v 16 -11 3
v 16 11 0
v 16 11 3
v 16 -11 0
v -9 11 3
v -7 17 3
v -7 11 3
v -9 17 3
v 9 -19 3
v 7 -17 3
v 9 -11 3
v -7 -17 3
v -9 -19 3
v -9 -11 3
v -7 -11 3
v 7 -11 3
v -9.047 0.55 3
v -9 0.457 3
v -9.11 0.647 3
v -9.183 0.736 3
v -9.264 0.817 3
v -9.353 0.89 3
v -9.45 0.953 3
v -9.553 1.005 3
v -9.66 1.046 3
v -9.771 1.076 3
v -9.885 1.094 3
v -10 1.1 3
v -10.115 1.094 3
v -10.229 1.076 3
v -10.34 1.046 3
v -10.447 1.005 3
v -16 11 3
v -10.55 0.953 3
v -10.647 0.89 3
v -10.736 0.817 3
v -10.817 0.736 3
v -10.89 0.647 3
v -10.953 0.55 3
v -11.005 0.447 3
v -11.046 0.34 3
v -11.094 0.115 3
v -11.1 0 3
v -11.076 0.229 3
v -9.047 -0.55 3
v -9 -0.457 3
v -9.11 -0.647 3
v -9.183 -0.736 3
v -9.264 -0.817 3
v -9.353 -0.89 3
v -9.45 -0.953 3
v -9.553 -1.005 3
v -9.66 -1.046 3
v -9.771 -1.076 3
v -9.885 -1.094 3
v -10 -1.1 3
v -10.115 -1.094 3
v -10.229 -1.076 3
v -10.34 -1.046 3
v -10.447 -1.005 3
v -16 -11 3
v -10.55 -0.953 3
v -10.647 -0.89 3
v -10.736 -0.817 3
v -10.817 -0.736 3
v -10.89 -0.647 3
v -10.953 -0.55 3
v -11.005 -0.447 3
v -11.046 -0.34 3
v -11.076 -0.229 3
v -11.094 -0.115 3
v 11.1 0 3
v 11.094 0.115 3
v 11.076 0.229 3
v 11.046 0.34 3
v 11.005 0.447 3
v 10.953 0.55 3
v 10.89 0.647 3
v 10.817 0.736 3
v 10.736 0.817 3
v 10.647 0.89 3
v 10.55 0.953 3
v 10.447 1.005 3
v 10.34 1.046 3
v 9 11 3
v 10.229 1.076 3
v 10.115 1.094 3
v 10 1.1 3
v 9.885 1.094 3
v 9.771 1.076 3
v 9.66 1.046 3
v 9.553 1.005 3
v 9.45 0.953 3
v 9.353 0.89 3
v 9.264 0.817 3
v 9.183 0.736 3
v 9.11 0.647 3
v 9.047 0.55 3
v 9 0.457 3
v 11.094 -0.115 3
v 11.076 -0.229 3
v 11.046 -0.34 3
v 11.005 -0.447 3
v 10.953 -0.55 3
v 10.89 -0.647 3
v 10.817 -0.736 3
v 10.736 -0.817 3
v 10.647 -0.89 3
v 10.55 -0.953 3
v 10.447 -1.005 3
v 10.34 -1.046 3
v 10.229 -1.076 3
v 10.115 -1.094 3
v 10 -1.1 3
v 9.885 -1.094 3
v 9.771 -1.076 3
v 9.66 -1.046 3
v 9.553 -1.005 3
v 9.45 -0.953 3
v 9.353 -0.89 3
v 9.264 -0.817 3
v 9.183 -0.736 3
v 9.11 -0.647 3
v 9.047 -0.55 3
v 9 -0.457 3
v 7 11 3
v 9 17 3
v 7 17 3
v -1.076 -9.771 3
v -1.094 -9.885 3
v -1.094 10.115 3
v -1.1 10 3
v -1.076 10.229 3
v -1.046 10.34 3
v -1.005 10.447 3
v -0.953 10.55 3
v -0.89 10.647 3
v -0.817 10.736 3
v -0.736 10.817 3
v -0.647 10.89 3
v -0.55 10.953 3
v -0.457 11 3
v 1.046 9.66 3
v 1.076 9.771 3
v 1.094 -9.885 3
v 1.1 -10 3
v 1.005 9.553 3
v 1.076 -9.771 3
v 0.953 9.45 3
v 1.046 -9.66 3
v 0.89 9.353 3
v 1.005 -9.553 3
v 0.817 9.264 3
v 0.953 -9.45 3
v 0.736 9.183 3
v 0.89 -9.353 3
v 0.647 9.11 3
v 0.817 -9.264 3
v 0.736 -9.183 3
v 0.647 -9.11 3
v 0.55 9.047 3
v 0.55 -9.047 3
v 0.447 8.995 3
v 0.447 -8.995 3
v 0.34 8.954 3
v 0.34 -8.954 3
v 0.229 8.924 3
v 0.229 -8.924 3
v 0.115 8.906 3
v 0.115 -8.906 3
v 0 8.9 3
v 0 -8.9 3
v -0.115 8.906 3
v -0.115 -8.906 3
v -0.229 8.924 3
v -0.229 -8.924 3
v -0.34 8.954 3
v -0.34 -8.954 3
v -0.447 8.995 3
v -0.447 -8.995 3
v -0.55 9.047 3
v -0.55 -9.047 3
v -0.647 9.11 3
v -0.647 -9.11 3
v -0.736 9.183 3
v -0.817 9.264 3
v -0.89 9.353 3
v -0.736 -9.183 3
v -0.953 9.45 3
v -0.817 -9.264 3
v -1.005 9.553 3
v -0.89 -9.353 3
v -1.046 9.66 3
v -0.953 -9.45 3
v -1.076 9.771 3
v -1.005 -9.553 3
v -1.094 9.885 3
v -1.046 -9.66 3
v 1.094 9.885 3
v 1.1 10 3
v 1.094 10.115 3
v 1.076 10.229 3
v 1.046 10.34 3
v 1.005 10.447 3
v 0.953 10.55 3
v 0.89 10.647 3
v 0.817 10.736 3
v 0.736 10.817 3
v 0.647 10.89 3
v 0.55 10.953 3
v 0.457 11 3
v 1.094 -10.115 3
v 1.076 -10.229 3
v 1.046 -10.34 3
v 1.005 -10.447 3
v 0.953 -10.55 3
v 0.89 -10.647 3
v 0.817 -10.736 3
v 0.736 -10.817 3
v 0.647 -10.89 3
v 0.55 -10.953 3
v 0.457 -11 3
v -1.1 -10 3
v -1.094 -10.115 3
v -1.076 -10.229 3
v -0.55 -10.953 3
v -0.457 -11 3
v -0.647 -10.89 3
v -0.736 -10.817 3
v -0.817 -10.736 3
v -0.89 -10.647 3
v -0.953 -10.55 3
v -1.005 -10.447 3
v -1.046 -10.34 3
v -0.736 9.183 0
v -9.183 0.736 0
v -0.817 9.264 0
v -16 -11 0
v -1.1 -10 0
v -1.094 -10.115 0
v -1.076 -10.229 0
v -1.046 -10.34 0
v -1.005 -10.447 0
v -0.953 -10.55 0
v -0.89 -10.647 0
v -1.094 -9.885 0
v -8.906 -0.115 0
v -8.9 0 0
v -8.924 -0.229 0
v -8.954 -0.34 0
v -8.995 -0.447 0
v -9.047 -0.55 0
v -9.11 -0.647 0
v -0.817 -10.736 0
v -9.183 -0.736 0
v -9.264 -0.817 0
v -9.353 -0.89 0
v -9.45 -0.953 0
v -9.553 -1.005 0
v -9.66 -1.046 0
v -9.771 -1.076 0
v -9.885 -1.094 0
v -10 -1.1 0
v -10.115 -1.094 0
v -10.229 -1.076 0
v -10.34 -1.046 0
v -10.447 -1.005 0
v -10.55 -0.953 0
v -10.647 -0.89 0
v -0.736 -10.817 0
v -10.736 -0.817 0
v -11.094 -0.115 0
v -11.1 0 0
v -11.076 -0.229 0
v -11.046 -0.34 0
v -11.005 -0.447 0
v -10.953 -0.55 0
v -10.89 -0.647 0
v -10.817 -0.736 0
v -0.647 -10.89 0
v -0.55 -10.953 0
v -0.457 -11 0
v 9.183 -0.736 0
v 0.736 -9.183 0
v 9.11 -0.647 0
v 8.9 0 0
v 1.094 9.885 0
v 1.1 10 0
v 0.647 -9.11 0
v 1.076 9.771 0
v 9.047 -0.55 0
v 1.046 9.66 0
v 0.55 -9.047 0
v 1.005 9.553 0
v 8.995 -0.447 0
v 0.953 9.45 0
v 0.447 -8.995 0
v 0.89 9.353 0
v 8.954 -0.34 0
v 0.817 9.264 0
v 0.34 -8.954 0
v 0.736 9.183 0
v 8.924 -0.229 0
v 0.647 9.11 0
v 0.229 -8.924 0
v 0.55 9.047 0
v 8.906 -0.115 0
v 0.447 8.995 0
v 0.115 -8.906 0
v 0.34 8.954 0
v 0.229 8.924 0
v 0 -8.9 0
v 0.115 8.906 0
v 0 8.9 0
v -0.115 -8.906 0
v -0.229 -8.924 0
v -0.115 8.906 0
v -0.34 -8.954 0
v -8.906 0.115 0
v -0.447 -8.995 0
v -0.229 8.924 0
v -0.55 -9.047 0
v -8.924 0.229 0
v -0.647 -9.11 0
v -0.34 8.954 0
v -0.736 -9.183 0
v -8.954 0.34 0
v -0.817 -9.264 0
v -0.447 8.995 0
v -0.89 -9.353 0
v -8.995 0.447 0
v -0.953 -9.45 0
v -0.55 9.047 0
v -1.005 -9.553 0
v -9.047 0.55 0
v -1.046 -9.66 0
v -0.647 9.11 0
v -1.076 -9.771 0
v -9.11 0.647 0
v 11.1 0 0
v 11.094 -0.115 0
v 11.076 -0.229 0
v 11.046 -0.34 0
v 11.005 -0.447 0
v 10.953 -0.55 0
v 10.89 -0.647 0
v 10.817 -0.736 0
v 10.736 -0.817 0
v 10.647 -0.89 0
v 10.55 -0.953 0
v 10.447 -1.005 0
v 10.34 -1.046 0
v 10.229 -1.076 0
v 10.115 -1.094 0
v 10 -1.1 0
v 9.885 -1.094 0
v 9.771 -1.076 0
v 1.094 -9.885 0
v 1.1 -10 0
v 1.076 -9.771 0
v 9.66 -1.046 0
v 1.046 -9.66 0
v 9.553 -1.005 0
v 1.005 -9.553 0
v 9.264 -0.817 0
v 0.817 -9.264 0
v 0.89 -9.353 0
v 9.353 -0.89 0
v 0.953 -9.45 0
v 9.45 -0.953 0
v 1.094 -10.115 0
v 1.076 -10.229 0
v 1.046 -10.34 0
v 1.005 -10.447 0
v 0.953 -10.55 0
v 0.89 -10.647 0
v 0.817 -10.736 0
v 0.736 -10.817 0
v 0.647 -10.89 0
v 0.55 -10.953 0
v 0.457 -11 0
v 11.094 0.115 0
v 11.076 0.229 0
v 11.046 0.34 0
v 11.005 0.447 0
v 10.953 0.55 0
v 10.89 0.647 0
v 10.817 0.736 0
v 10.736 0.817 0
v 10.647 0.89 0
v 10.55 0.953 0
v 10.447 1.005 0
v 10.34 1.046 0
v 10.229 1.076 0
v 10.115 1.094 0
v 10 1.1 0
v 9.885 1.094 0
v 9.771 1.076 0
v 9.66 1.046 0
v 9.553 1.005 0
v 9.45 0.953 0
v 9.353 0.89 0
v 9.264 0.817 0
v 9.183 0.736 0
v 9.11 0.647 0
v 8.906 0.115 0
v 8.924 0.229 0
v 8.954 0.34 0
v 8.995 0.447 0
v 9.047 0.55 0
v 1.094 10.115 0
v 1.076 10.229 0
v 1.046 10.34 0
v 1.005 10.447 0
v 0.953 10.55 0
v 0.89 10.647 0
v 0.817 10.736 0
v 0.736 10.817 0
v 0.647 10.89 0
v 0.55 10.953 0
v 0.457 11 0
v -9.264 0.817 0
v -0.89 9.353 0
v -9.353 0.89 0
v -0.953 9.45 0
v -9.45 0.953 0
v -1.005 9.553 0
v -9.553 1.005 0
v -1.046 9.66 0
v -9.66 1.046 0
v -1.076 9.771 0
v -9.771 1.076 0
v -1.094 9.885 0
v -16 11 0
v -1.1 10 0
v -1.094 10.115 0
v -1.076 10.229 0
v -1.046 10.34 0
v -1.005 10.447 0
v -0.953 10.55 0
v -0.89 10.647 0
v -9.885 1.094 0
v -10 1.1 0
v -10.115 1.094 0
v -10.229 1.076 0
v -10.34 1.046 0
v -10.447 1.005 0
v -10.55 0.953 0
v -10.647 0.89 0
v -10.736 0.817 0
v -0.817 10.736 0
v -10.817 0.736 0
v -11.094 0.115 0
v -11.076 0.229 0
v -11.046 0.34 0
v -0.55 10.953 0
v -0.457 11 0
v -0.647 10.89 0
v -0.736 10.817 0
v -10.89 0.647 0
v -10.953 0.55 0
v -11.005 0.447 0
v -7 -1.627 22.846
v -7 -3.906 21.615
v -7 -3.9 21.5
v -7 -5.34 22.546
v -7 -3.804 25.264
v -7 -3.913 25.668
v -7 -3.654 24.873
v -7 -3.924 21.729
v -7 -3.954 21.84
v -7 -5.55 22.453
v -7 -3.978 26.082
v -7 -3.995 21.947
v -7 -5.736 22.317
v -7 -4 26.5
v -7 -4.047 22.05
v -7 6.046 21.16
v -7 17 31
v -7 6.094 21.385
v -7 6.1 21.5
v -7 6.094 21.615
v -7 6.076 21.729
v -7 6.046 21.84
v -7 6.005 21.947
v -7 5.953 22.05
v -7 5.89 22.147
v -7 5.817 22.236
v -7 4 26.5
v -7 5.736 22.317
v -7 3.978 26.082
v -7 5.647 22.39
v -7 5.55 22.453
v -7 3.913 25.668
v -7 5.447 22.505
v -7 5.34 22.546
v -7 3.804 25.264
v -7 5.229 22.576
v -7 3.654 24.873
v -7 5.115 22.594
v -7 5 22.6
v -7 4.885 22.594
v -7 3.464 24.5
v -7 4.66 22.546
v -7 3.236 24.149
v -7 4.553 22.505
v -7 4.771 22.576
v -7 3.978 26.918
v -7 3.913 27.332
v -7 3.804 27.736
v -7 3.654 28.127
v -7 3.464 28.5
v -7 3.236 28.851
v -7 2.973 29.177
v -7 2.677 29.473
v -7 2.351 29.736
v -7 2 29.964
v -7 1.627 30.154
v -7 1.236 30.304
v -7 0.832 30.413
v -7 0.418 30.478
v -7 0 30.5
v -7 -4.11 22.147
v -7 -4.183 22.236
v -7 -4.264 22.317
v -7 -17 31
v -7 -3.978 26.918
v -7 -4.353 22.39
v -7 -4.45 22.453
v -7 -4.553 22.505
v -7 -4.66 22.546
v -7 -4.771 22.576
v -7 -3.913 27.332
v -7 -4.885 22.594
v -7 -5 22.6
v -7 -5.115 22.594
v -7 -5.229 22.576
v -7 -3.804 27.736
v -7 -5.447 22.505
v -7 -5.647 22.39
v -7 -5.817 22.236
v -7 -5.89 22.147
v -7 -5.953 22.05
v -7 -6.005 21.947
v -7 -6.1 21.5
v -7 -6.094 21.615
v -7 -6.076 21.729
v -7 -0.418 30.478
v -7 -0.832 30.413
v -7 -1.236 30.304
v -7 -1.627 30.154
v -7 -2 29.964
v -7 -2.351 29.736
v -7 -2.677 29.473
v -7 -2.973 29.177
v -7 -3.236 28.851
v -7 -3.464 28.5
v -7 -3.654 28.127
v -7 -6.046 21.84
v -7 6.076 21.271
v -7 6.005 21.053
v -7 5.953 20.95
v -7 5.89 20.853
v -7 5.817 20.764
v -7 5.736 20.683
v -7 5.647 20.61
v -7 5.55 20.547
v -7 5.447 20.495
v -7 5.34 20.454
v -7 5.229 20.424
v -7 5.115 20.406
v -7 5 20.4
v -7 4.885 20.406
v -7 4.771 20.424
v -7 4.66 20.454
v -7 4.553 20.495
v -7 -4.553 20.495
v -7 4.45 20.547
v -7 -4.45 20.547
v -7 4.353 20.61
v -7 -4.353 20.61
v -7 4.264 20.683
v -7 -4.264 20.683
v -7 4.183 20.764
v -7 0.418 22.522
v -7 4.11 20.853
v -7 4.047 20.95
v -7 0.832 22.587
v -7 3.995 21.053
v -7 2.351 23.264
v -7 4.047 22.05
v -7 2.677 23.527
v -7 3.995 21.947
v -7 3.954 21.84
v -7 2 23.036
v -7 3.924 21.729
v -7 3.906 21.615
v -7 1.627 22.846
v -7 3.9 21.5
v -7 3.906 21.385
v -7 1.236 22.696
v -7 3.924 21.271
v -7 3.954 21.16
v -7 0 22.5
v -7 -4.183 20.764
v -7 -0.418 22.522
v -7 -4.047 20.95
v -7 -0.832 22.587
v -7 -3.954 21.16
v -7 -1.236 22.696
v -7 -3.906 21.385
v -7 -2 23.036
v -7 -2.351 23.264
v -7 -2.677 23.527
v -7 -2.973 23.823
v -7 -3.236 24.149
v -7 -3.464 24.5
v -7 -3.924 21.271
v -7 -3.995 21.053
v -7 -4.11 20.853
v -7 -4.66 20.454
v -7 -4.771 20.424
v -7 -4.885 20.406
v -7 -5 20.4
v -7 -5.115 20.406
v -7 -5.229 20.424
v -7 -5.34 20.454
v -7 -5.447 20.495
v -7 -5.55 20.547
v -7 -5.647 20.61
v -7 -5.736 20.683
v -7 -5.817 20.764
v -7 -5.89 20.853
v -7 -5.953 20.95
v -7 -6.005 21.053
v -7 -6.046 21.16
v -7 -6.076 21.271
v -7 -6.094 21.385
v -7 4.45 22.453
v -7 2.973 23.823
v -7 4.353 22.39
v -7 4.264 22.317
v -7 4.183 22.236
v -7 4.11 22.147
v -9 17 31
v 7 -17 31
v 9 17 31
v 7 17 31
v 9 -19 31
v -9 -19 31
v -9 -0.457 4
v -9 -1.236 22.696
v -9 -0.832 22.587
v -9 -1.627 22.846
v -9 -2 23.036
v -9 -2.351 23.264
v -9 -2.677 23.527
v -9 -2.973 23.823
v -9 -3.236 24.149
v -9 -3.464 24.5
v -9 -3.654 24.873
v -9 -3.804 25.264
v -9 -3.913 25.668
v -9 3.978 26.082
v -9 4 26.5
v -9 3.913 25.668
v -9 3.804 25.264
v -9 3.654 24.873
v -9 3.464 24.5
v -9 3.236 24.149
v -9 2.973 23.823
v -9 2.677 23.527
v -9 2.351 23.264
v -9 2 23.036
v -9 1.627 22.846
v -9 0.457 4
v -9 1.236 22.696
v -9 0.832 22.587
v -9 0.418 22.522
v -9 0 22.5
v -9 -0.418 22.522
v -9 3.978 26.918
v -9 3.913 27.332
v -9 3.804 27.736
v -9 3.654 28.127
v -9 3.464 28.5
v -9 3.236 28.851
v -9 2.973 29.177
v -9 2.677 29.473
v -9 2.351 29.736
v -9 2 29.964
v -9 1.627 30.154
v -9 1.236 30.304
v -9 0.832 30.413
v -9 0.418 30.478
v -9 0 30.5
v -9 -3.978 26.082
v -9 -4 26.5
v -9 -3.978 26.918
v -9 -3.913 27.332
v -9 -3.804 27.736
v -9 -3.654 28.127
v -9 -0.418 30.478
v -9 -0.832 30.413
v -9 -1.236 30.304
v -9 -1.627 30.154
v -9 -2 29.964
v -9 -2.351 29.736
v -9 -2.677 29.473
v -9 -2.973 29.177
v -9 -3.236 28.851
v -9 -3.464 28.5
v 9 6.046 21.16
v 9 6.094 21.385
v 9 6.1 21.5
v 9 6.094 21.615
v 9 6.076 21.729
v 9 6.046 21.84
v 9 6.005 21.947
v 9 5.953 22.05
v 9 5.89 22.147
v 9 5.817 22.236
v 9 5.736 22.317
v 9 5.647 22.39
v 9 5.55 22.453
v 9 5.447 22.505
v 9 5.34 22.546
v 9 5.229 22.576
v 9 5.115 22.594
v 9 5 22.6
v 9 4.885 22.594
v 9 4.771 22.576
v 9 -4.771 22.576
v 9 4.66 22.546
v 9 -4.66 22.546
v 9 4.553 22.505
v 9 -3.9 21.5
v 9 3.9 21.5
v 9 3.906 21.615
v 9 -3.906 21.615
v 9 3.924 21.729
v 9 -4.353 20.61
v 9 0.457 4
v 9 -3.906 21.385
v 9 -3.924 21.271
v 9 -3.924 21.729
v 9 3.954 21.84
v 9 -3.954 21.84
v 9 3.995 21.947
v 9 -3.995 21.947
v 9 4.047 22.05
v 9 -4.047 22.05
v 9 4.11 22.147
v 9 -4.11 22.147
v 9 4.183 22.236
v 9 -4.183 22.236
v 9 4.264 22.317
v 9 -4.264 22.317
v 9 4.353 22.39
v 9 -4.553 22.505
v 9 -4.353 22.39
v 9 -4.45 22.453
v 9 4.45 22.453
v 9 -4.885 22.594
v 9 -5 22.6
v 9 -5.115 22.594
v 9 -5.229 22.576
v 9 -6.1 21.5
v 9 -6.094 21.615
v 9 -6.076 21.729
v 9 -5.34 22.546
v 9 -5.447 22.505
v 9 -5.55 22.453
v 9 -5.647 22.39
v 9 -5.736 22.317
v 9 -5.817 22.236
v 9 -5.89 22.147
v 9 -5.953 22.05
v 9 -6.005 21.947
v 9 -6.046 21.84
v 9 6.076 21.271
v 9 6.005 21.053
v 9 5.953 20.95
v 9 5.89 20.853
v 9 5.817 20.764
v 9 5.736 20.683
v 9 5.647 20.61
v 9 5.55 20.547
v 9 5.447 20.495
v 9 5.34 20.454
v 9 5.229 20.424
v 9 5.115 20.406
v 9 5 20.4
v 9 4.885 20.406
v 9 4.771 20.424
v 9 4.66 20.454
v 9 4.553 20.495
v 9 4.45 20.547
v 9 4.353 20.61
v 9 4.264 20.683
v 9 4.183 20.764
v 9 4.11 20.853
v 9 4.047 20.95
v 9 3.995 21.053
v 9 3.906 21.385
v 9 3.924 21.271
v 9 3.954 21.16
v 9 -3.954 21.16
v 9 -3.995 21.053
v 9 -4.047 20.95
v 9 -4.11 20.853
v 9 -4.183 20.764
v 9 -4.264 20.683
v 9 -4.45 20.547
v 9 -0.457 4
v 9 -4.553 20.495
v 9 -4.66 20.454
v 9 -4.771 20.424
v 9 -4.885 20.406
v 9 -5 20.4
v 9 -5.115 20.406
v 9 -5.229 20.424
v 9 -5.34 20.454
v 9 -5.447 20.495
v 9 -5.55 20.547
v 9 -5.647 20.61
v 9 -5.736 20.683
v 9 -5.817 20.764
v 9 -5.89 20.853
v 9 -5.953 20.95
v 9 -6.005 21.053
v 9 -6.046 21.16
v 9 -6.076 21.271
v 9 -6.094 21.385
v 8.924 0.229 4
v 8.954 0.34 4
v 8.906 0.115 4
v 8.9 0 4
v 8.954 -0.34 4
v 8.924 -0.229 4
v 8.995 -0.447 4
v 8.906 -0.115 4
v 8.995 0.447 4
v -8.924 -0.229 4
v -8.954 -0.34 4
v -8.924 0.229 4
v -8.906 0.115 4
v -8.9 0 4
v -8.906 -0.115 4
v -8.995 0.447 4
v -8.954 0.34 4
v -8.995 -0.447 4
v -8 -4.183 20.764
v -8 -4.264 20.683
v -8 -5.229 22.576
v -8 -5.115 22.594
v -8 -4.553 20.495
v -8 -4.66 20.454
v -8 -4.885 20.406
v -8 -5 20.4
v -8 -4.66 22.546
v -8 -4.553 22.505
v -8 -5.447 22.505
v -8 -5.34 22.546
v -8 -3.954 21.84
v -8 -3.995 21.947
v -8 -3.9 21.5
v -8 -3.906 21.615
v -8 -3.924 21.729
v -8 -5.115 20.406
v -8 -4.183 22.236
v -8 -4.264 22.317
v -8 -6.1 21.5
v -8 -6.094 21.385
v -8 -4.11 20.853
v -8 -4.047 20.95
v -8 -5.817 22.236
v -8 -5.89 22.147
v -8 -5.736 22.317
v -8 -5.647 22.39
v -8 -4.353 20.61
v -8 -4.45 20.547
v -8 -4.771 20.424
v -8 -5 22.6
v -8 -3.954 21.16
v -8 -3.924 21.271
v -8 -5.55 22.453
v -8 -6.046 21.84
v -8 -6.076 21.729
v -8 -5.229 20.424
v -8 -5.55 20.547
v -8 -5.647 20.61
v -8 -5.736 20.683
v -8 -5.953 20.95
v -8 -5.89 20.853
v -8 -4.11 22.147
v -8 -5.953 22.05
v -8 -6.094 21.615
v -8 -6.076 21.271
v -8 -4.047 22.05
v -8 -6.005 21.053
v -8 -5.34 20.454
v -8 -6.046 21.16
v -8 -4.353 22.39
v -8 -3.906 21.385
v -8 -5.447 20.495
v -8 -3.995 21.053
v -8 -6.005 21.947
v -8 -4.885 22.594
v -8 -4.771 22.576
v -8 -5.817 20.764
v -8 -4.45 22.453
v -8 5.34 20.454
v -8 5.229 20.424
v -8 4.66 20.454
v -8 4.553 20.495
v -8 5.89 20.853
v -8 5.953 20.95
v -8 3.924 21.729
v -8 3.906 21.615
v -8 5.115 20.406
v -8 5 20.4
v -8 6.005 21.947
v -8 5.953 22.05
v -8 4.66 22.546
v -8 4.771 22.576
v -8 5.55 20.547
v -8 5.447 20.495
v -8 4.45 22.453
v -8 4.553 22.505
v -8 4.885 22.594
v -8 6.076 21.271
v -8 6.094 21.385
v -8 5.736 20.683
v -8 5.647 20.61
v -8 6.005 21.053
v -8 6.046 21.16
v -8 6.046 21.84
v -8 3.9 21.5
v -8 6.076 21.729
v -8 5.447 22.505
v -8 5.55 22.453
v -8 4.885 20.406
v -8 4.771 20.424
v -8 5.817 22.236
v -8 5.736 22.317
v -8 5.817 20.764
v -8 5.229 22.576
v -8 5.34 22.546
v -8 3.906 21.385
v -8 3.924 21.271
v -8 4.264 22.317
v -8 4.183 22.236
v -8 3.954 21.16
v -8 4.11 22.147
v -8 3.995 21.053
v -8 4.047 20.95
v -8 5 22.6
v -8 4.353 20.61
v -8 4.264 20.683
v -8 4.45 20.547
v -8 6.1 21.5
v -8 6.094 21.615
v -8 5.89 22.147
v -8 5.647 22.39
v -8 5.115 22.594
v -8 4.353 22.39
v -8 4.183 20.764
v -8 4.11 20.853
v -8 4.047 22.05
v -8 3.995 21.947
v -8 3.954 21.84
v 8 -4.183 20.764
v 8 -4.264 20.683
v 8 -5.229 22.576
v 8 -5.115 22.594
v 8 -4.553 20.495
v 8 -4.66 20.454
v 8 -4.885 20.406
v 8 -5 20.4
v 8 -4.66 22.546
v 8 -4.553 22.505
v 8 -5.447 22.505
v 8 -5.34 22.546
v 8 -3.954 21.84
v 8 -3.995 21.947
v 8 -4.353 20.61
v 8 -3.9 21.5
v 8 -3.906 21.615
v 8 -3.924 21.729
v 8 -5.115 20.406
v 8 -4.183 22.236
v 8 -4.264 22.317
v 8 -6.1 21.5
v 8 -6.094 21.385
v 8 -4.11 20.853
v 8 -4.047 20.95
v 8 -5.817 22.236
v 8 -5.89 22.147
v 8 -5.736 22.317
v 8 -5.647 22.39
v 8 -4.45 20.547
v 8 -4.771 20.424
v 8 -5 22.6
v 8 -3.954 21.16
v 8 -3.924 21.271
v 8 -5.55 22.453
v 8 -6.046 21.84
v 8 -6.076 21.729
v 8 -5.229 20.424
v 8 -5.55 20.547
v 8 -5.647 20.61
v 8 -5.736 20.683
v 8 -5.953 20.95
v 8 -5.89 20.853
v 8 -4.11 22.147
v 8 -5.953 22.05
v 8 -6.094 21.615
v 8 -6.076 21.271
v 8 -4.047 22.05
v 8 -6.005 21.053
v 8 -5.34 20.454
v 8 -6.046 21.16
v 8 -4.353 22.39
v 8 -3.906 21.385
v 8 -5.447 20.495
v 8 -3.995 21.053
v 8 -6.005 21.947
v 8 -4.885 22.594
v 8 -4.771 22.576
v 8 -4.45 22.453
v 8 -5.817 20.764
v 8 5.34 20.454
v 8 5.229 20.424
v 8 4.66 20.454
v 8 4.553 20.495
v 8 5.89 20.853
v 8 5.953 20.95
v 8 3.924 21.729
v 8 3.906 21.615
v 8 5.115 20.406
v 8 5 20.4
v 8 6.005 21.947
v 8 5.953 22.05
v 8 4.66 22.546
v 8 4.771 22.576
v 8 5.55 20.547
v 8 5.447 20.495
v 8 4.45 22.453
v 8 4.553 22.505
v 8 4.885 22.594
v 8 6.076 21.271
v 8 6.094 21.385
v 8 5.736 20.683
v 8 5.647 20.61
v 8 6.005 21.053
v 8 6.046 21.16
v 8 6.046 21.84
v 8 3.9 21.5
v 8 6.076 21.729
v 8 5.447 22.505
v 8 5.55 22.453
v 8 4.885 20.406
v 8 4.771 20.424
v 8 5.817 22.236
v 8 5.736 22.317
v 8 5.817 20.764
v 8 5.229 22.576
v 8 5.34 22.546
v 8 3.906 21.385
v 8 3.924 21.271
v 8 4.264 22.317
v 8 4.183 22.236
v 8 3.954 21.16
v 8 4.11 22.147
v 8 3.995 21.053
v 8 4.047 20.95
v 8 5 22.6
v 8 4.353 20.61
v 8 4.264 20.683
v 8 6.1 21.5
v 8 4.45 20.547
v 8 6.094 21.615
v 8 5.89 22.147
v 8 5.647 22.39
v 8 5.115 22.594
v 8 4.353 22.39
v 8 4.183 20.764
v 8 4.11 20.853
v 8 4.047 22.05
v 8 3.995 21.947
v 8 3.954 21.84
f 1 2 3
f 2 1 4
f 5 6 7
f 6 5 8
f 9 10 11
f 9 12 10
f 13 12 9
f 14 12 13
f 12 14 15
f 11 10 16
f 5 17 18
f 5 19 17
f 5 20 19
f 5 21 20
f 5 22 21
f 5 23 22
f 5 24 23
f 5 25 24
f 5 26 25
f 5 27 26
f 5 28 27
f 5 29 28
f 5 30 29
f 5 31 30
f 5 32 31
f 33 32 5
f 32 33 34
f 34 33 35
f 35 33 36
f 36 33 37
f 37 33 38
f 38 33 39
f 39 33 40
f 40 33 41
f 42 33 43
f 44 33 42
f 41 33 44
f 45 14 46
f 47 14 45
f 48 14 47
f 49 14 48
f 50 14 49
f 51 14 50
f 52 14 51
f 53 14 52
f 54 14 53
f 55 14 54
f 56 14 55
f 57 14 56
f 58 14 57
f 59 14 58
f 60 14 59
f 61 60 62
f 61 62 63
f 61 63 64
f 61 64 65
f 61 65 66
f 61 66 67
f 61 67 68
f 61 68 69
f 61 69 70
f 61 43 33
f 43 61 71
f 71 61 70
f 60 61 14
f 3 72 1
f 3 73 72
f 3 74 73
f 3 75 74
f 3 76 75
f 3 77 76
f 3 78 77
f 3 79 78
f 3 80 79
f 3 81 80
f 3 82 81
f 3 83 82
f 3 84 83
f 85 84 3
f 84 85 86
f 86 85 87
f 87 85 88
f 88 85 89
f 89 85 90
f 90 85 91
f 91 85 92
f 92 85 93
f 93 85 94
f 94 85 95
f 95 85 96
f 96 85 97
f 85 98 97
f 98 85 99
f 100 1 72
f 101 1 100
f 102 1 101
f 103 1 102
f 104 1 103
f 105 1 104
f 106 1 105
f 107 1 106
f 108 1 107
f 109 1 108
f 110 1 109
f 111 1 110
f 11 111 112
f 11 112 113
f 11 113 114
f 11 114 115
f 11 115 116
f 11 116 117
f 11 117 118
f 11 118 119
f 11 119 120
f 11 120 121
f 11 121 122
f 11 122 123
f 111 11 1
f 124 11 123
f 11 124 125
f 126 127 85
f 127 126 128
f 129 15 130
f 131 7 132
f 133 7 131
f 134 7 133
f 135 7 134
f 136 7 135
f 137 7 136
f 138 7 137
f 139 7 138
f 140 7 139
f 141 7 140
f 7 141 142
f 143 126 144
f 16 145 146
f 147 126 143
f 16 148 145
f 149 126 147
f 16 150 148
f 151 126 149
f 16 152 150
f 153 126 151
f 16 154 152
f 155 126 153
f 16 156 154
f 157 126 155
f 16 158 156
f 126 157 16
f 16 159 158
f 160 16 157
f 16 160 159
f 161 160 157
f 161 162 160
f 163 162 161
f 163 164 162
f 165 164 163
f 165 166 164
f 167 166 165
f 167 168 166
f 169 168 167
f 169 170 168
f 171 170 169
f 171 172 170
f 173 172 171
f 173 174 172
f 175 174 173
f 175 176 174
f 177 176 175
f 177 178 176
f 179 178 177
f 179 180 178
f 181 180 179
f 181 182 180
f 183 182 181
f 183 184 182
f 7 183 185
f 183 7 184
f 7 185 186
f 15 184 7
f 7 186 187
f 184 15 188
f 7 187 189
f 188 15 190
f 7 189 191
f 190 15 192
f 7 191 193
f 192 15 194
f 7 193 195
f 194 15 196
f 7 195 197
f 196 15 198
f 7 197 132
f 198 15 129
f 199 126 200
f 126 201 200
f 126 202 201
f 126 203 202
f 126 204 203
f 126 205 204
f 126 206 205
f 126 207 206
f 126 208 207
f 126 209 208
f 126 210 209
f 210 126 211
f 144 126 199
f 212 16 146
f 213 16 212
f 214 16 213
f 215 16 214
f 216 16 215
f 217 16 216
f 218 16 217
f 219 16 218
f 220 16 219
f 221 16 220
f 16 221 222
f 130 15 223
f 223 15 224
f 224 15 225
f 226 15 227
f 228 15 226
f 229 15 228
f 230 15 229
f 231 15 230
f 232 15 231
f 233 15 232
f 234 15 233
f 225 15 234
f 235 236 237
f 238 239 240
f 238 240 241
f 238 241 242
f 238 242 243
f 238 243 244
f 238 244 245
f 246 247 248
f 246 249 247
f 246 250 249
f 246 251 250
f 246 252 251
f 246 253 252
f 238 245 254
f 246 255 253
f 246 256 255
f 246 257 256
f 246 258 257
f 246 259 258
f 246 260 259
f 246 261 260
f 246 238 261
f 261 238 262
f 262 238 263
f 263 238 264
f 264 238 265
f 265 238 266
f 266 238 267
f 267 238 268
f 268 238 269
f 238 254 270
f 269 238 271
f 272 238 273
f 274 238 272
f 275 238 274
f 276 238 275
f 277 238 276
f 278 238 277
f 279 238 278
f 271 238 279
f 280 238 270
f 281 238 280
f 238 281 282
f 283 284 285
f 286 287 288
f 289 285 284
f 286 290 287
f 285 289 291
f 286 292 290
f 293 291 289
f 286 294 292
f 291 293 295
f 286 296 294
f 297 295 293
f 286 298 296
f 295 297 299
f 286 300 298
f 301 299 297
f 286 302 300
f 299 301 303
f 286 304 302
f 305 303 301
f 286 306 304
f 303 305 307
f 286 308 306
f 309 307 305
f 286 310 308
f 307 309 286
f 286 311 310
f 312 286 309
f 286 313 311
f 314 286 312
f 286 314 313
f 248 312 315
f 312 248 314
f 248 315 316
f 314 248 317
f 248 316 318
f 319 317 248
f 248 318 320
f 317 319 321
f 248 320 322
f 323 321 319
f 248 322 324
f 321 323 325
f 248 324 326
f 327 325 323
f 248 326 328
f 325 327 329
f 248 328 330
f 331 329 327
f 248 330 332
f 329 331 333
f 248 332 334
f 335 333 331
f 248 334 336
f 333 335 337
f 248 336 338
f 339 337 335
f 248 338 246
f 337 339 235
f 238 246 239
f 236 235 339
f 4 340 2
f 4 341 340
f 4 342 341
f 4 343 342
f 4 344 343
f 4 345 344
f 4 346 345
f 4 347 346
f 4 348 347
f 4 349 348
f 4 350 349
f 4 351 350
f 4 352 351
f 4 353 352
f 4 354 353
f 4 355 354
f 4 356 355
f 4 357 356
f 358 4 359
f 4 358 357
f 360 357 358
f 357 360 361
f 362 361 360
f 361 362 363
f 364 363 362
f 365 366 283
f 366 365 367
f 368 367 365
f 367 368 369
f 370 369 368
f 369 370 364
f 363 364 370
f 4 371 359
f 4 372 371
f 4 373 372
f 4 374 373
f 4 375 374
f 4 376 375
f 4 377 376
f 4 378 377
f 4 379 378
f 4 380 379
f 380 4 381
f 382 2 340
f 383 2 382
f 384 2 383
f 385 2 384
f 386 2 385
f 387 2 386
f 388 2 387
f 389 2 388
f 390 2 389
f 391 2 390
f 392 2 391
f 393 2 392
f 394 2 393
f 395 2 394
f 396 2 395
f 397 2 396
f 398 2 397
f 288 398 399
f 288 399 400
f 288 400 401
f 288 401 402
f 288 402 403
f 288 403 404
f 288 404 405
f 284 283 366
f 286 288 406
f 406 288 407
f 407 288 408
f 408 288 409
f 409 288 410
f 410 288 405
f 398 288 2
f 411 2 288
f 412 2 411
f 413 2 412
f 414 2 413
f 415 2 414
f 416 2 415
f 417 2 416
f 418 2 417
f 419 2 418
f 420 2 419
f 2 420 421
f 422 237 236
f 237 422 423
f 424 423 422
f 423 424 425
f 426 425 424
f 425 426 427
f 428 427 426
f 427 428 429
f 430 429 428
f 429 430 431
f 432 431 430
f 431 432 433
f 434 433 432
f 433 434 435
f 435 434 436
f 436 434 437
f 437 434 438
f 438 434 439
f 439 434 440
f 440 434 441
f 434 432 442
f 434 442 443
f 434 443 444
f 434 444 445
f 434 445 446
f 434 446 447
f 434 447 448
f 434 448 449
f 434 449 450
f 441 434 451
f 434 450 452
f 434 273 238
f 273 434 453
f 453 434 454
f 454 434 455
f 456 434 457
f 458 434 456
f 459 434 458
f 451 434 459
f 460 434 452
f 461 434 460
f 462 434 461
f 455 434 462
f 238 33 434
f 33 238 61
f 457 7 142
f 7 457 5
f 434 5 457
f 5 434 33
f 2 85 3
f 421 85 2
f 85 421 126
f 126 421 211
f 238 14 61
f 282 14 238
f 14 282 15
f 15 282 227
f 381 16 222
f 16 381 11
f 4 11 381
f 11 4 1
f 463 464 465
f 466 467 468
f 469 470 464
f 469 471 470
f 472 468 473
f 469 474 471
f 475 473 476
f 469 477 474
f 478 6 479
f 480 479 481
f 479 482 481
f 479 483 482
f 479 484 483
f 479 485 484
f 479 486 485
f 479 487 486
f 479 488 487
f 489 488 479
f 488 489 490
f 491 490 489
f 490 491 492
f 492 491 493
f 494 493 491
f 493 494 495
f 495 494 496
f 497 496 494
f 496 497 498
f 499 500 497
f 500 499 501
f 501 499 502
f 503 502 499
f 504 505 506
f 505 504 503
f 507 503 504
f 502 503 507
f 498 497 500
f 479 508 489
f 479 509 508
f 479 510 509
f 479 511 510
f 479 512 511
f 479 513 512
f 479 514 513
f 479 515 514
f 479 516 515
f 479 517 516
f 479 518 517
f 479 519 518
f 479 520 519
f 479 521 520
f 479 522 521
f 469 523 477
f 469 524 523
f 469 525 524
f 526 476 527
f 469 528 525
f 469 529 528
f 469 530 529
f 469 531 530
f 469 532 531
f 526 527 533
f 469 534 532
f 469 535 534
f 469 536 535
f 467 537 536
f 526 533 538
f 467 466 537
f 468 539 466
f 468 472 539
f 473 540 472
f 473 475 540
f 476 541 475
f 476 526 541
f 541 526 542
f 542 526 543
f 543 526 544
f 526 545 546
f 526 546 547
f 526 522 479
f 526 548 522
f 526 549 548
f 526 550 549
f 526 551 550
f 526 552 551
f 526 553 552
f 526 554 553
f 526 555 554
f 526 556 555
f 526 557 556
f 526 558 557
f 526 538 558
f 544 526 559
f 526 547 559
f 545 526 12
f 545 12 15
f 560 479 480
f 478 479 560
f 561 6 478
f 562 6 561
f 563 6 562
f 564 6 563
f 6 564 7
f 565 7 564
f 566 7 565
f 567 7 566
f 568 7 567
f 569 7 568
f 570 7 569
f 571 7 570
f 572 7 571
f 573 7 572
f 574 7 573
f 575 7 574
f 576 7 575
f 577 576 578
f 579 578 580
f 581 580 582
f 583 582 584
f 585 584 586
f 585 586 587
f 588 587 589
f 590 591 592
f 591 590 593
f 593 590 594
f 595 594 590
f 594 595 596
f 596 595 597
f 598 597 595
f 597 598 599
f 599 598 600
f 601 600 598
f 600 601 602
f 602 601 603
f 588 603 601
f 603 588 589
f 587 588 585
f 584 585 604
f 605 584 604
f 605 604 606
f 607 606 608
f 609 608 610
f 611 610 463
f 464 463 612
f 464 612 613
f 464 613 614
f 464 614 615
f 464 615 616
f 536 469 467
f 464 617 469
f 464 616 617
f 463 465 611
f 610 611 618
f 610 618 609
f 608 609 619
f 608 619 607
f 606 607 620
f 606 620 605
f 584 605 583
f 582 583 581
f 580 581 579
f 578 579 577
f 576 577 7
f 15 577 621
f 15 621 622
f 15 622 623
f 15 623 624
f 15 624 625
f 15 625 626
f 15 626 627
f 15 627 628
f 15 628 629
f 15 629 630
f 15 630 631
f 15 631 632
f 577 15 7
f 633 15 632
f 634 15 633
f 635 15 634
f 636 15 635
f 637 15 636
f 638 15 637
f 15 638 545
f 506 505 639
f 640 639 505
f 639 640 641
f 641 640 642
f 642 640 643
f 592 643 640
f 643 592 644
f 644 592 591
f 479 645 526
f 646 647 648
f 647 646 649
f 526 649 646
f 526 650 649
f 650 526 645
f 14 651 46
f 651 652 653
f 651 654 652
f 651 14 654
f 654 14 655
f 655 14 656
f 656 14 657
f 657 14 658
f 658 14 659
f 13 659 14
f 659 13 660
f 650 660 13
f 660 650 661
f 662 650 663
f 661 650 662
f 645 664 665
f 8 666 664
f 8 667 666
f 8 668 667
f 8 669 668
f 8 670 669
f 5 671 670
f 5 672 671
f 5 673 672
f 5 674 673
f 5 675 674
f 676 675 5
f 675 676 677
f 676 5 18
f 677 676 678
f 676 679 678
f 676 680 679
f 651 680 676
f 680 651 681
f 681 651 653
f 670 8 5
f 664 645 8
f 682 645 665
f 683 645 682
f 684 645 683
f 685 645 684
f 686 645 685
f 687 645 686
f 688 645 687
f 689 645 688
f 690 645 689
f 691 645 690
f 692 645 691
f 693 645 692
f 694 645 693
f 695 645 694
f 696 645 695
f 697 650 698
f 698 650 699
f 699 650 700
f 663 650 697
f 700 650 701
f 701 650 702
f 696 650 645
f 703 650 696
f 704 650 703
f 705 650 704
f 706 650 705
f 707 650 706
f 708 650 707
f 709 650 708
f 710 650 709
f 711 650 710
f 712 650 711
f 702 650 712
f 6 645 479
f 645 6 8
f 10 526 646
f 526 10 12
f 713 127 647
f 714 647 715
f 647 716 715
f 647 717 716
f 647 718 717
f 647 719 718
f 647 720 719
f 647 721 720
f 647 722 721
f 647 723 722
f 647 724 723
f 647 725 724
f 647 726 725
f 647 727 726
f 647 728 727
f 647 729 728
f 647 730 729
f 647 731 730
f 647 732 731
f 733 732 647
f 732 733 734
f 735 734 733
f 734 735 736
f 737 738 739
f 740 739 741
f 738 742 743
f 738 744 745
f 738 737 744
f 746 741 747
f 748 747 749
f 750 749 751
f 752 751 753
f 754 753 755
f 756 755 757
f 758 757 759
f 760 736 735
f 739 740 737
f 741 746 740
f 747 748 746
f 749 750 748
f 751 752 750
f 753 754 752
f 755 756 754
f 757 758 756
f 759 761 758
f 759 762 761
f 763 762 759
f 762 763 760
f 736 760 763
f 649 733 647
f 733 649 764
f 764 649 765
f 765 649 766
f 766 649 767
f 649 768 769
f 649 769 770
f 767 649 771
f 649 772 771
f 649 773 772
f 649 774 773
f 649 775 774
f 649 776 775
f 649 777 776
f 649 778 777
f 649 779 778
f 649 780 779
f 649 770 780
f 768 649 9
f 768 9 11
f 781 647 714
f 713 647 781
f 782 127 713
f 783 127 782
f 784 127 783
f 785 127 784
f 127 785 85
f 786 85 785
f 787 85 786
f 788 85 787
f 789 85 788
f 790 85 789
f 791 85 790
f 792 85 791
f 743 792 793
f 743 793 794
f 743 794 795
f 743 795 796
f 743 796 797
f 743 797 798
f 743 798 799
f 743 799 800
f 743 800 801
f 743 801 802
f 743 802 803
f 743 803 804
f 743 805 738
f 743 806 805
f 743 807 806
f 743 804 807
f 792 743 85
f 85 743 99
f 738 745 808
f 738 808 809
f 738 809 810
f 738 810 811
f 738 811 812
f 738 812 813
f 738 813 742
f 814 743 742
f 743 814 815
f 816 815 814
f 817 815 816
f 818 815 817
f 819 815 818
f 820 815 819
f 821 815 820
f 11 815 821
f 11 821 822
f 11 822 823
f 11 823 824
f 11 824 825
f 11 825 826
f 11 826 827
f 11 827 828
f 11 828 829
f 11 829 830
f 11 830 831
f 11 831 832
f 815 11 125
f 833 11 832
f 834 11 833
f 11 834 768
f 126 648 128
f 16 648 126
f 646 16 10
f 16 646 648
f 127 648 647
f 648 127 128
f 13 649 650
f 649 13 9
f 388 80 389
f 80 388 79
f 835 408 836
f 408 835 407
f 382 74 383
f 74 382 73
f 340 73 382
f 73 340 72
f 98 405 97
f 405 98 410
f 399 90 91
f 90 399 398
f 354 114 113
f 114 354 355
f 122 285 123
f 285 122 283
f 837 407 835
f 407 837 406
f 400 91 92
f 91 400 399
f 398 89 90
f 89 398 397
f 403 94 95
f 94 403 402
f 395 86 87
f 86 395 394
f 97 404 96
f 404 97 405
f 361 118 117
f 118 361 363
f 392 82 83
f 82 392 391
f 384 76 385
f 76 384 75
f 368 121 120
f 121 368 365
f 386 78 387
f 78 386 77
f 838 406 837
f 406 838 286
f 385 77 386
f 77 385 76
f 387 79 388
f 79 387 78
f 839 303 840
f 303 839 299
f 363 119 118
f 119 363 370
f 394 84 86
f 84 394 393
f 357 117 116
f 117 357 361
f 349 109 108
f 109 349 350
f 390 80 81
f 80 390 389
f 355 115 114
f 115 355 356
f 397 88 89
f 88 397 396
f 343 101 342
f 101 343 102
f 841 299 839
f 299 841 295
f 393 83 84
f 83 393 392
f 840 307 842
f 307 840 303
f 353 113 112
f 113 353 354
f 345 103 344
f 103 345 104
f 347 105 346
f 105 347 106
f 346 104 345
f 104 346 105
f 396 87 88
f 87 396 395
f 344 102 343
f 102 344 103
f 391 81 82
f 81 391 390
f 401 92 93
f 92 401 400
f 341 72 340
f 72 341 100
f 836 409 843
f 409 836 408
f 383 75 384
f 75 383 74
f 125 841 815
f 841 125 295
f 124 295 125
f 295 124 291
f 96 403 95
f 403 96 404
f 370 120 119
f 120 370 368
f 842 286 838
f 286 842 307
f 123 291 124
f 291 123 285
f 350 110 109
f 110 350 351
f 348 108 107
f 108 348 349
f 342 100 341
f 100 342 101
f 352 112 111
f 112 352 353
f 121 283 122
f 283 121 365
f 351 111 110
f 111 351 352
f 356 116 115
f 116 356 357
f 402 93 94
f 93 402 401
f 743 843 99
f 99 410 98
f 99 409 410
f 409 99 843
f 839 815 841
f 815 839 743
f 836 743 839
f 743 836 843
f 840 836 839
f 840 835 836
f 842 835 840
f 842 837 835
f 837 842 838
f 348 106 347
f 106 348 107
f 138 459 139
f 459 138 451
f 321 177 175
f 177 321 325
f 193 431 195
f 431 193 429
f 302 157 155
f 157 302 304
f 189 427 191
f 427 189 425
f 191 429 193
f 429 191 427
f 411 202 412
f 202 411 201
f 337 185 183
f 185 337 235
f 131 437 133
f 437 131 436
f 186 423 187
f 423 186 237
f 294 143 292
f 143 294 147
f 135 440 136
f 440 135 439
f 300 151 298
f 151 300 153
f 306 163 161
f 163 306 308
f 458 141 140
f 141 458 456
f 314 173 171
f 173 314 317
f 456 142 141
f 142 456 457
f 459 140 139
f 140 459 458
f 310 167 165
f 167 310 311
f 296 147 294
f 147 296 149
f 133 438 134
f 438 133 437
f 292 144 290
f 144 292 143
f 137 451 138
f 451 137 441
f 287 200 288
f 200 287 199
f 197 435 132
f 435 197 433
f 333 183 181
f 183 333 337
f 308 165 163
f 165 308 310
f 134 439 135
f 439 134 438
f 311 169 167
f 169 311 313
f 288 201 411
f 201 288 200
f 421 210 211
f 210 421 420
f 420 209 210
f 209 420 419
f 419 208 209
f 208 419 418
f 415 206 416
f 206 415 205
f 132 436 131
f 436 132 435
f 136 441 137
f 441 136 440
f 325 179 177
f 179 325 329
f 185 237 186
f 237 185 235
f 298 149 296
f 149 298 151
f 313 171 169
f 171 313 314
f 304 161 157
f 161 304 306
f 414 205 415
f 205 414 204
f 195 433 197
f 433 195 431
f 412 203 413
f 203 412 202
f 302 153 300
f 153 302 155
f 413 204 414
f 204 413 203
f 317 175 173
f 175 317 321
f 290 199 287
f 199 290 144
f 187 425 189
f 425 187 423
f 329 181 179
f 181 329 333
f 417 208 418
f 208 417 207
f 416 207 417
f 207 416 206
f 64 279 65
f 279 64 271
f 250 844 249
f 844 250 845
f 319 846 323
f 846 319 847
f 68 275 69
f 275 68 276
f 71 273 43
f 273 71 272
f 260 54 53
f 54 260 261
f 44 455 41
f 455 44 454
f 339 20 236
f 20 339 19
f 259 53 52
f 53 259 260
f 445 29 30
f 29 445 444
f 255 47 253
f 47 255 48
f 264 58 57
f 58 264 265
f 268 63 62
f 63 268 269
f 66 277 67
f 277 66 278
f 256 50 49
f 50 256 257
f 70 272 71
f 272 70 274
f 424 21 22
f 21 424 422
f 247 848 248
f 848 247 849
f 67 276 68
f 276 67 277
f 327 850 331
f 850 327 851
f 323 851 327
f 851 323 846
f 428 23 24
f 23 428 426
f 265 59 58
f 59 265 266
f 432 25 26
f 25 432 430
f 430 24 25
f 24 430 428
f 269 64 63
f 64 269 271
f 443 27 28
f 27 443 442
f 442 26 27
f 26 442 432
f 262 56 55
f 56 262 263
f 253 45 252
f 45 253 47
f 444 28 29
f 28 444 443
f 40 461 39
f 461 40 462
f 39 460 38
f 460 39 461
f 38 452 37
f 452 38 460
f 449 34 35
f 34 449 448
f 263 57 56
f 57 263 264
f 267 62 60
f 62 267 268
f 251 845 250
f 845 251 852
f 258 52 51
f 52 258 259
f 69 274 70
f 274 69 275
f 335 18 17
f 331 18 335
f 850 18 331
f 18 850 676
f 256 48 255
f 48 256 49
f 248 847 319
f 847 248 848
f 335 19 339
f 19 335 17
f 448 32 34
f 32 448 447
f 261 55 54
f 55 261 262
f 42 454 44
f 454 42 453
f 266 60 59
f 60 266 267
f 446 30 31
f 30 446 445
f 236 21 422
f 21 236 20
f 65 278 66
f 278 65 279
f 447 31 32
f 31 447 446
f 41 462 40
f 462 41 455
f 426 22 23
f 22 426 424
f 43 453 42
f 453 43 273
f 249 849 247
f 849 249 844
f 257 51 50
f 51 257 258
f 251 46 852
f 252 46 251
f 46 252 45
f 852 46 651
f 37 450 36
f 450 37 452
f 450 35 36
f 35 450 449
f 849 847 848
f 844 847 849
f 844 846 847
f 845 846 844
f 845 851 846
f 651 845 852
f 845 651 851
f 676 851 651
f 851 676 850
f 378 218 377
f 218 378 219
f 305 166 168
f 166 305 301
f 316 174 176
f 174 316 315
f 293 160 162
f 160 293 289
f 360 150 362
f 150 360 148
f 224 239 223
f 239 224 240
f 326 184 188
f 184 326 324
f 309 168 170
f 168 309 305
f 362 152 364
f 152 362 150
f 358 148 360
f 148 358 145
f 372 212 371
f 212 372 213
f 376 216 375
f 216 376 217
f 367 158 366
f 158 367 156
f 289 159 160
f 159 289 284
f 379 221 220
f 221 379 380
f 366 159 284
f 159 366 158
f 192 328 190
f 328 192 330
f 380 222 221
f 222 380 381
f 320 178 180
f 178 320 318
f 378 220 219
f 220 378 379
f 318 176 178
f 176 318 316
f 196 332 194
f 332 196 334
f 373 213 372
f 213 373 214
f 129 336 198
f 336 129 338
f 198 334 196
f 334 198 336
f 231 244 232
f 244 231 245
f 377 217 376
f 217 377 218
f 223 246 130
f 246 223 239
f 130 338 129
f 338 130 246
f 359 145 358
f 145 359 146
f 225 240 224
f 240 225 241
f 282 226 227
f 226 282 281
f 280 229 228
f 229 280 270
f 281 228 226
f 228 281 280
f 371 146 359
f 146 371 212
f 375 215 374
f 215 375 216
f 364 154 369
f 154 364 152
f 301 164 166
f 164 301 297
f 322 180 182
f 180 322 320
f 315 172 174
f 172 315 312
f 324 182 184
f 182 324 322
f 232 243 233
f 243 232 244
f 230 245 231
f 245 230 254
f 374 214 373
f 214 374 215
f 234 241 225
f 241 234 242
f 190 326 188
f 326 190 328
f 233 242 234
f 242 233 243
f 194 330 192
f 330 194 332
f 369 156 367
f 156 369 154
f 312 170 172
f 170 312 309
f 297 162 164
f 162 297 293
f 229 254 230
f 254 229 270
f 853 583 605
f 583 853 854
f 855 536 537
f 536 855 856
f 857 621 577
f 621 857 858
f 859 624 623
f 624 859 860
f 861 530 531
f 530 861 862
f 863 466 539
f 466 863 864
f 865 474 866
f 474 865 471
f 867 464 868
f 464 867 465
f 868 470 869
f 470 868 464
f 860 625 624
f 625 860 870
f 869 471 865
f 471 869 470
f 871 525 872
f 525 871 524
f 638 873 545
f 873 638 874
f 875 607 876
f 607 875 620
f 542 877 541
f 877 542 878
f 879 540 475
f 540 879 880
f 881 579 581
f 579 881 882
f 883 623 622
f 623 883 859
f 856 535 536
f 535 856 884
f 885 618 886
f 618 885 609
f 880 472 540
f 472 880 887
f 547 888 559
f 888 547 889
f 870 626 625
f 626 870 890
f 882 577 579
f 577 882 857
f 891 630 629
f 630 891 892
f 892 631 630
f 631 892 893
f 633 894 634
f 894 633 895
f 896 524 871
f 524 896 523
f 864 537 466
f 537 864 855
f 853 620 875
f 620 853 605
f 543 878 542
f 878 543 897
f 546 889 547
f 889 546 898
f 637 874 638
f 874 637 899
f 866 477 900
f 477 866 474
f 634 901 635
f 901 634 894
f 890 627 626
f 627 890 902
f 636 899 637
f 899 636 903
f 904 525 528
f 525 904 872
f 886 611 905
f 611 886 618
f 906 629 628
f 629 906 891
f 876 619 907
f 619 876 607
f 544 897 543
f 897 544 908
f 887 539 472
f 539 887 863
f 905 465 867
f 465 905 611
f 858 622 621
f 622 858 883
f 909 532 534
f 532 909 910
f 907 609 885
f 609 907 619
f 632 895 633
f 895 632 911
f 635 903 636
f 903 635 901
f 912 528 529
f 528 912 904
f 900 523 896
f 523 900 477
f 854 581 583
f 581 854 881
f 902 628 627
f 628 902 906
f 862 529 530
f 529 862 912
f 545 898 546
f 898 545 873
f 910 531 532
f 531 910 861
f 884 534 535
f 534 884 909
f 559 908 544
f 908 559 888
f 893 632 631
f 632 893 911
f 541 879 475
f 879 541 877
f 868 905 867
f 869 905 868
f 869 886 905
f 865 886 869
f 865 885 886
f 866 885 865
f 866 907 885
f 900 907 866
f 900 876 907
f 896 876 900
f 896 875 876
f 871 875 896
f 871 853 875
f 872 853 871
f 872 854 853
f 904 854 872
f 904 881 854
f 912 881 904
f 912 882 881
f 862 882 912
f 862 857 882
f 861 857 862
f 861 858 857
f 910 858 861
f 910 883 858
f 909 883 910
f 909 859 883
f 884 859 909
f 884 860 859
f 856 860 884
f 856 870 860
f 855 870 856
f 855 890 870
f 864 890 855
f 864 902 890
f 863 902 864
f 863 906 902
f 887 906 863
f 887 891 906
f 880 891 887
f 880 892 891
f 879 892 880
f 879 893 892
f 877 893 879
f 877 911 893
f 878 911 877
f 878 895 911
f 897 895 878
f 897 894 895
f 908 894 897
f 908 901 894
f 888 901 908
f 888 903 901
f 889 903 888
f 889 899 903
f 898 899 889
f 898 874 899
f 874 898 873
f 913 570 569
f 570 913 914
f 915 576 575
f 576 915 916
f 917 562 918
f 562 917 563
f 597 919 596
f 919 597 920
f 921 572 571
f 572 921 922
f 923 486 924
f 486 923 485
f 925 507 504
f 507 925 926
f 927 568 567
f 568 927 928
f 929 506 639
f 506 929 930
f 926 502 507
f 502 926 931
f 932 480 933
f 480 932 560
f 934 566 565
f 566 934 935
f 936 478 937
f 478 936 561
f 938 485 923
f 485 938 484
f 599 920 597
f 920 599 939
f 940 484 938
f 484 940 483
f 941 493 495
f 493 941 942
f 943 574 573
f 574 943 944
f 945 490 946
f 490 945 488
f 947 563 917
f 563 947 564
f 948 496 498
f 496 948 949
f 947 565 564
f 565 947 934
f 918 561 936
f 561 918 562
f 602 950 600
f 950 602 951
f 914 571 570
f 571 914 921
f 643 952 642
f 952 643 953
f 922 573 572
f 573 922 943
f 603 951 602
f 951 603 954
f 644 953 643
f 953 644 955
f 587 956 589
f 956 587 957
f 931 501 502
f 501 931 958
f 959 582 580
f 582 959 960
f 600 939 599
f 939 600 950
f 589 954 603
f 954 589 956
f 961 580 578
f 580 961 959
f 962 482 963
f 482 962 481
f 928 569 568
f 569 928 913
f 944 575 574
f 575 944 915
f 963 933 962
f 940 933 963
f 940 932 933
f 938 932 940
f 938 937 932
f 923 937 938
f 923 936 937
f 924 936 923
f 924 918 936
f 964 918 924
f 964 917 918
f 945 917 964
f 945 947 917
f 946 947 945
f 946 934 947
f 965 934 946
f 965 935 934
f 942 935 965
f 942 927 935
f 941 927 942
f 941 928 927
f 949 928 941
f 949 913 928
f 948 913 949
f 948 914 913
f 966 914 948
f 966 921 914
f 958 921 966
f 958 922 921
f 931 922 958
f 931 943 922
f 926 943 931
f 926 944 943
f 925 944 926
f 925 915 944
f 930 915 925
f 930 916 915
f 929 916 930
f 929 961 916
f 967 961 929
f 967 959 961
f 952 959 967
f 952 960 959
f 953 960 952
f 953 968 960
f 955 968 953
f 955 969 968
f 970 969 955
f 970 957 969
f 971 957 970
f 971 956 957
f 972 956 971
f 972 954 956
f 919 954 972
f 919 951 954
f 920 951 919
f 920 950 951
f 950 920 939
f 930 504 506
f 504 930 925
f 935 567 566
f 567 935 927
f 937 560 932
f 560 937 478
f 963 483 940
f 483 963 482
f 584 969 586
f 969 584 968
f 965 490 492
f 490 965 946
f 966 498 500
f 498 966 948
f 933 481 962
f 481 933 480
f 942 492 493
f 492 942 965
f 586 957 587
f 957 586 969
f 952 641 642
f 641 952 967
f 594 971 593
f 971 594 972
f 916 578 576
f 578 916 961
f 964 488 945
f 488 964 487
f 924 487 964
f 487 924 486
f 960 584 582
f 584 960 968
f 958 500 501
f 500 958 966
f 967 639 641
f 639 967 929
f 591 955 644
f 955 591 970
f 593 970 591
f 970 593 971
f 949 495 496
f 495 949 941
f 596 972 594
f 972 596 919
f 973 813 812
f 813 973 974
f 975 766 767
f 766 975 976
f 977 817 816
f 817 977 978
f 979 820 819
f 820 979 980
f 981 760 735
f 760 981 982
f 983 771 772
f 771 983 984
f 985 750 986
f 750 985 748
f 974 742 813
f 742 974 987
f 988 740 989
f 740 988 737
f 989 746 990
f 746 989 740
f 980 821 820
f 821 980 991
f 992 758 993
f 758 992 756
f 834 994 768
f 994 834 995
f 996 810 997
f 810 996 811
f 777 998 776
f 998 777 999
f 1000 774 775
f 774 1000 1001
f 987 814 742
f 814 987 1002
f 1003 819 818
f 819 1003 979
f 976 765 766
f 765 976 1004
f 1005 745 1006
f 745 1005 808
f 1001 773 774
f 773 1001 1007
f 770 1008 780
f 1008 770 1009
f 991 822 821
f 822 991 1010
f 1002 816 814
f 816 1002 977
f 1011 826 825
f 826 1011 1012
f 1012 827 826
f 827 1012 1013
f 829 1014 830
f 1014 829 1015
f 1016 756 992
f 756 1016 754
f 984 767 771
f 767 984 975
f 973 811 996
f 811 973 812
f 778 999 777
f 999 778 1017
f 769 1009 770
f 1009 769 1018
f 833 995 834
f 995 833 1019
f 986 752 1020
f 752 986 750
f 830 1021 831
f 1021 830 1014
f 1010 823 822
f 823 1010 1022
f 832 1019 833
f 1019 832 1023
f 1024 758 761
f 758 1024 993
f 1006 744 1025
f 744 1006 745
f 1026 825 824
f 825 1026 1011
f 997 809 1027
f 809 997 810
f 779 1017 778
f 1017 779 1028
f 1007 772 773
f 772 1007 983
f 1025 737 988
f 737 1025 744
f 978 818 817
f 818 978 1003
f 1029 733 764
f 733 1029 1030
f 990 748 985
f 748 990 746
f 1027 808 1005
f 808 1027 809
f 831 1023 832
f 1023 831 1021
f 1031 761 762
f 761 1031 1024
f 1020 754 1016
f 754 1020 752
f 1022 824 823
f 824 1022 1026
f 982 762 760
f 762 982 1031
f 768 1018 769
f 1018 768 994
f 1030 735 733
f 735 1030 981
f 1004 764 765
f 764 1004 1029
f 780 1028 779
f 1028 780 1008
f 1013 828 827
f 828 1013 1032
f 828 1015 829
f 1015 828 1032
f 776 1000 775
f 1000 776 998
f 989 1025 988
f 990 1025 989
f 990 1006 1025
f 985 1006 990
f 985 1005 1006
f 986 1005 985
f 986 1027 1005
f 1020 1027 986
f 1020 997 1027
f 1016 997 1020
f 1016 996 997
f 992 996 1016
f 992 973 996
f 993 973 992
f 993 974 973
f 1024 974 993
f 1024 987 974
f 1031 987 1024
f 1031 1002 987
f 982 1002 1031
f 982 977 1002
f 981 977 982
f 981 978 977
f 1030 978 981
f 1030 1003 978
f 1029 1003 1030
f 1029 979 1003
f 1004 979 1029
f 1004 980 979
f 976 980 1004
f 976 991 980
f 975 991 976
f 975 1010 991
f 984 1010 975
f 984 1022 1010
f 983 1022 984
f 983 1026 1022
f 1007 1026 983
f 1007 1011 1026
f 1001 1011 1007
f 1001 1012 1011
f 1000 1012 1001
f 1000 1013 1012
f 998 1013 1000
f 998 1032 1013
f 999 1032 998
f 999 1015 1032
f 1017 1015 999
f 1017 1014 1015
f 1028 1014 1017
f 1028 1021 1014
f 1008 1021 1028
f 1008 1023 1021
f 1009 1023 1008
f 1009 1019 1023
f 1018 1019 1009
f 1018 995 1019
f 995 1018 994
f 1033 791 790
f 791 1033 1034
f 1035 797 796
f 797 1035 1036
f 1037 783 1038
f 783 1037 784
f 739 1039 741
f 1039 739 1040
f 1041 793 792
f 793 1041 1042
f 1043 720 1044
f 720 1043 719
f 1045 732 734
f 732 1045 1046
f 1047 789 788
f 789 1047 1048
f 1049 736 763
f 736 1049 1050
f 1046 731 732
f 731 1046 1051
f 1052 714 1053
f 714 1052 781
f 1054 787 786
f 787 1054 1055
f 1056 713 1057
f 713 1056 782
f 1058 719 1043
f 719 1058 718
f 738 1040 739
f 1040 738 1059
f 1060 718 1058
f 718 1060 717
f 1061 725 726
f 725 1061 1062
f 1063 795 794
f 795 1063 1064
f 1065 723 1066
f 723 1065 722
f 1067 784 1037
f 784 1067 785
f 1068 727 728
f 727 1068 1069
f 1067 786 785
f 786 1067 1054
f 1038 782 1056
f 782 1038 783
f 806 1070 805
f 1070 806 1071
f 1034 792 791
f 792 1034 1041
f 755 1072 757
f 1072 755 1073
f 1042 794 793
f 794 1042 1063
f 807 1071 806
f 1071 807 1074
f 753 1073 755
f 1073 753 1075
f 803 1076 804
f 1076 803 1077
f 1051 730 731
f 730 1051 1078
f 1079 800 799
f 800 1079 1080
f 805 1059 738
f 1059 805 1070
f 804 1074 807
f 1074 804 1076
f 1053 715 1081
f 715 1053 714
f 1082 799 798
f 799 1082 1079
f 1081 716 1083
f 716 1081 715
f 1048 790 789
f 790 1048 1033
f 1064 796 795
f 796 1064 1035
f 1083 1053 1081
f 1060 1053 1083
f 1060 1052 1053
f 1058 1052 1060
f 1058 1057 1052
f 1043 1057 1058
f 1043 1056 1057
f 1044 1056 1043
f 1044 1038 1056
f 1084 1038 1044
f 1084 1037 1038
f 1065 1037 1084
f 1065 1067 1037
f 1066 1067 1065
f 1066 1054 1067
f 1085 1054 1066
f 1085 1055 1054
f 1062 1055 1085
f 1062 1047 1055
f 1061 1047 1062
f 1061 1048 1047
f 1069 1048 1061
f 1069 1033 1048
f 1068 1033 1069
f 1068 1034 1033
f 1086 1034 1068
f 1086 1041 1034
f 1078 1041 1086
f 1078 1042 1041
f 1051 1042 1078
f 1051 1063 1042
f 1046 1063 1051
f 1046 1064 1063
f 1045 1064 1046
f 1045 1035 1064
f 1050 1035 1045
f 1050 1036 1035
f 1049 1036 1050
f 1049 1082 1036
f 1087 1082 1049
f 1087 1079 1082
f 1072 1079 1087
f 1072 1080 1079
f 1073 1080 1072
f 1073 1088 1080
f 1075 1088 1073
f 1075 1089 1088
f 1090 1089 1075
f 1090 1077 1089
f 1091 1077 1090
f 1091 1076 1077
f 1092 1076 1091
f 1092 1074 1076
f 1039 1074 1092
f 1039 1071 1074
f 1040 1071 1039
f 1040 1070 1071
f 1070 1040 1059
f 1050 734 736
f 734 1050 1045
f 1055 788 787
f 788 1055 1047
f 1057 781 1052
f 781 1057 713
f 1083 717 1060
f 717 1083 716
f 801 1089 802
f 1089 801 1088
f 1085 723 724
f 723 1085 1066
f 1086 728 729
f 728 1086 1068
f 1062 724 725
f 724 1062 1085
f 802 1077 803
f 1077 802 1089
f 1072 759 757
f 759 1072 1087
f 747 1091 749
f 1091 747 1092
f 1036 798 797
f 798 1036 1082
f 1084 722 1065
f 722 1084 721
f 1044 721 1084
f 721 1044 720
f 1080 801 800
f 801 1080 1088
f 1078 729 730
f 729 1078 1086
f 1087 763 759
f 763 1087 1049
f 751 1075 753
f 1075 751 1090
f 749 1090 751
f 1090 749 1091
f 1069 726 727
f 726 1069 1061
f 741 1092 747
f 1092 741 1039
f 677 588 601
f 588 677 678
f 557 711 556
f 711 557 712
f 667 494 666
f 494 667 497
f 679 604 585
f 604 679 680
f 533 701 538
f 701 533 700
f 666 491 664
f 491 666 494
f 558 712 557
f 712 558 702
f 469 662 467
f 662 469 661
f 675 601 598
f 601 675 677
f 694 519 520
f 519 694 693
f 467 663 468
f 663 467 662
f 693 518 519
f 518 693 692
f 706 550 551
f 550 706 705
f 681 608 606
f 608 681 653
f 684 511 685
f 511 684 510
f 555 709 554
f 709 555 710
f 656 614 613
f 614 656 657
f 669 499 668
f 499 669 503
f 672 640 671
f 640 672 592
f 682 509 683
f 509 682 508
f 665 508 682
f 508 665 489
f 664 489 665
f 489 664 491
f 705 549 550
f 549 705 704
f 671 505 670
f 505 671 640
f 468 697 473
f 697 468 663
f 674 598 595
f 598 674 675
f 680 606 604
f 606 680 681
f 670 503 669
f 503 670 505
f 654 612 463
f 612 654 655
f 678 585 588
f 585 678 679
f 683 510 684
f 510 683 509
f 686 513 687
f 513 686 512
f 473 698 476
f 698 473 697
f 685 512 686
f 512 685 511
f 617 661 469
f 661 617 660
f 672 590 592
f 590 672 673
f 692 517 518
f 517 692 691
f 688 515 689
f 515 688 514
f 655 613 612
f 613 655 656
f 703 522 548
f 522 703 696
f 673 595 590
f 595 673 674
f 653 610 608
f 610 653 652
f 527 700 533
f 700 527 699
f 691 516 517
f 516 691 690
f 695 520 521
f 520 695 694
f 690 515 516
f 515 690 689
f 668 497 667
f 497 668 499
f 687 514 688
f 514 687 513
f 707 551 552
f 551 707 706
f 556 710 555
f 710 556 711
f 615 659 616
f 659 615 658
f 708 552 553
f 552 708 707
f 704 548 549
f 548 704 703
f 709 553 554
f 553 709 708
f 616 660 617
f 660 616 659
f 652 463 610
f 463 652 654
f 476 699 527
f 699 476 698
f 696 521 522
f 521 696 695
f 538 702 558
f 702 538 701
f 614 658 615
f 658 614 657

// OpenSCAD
// ============================================================================
// P3_Shoulder_Bracket
// ============================================================================
// SeaBreeze-Inspector 3DOF 机械臂 — 3D打印零件
// 参数与代码完全吻合: L1=55, L2=45, L3=35, base_height=25
// 生成日期: 2026
// ============================================================================

$fn = 60;

L1 = 55;
L2 = 45;
L3 = 35;
BASE_H = 25;

// SG90 舵机参数 (mm)
SG90_BODY_W = 22.2;
SG90_BODY_H = 11.8;
SG90_BODY_L = 31.0;
SG90_AXIS_H = 26.5;
SG90_AXIS_D = 4.8;
SG90_EAR_HOLE_D = 2.0;
SG90_EAR_SPAN_X = 10.0;
SG90_EAR_SPAN_Y = 22.5;

// 紧固件
M2_D = 2.2;
M2p5_D = 2.7;
M3_D = 3.2;

// 打印参数
WALL = 2.0;
LINK_W = 15.0;
LINK_T = 3.0;


U_W = 14; U_D = 34; U_H = 28; U_WALL = WALL;
FLANGE_W = 32; FLANGE_D = 22; FLANGE_T = 3;

module shoulder_bracket() {
    difference() {
        union() {
            translate([0, 0, FLANGE_T/2])
                cube([FLANGE_W, FLANGE_D, FLANGE_T], center=true);
            translate([-(U_W/2 + U_WALL/2), 0, U_H/2 + FLANGE_T])
                cube([U_WALL, U_D, U_H], center=true);
            translate([U_W/2 + U_WALL/2, 0, U_H/2 + FLANGE_T])
                cube([U_WALL, U_D, U_H], center=true);
            translate([0, -(U_D/2 + U_WALL/2), U_H/2 + FLANGE_T])
                cube([U_W + 2*U_WALL, U_WALL, U_H], center=true);
        }
        for(i=[0:3])
            rotate([0, 0, i*90])
            translate([10, 0, -1])
            cylinder(h=FLANGE_T+2, d=M2_D);
        for(side=[-1,1]) for(hole=[-1,1])
            translate([side*(U_W/2 + U_WALL/2), hole*SG90_EAR_SPAN_X/2, SG90_AXIS_H - 5])
            rotate([0, 90, 0])
            cylinder(h=U_WALL+2, d=M2_D);
        translate([-(U_W/2 + U_WALL + 1), 0, SG90_AXIS_H])
            rotate([0, 90, 0])
            cylinder(h=U_WALL+2, d=8);
    }
}
shoulder_bracket();
